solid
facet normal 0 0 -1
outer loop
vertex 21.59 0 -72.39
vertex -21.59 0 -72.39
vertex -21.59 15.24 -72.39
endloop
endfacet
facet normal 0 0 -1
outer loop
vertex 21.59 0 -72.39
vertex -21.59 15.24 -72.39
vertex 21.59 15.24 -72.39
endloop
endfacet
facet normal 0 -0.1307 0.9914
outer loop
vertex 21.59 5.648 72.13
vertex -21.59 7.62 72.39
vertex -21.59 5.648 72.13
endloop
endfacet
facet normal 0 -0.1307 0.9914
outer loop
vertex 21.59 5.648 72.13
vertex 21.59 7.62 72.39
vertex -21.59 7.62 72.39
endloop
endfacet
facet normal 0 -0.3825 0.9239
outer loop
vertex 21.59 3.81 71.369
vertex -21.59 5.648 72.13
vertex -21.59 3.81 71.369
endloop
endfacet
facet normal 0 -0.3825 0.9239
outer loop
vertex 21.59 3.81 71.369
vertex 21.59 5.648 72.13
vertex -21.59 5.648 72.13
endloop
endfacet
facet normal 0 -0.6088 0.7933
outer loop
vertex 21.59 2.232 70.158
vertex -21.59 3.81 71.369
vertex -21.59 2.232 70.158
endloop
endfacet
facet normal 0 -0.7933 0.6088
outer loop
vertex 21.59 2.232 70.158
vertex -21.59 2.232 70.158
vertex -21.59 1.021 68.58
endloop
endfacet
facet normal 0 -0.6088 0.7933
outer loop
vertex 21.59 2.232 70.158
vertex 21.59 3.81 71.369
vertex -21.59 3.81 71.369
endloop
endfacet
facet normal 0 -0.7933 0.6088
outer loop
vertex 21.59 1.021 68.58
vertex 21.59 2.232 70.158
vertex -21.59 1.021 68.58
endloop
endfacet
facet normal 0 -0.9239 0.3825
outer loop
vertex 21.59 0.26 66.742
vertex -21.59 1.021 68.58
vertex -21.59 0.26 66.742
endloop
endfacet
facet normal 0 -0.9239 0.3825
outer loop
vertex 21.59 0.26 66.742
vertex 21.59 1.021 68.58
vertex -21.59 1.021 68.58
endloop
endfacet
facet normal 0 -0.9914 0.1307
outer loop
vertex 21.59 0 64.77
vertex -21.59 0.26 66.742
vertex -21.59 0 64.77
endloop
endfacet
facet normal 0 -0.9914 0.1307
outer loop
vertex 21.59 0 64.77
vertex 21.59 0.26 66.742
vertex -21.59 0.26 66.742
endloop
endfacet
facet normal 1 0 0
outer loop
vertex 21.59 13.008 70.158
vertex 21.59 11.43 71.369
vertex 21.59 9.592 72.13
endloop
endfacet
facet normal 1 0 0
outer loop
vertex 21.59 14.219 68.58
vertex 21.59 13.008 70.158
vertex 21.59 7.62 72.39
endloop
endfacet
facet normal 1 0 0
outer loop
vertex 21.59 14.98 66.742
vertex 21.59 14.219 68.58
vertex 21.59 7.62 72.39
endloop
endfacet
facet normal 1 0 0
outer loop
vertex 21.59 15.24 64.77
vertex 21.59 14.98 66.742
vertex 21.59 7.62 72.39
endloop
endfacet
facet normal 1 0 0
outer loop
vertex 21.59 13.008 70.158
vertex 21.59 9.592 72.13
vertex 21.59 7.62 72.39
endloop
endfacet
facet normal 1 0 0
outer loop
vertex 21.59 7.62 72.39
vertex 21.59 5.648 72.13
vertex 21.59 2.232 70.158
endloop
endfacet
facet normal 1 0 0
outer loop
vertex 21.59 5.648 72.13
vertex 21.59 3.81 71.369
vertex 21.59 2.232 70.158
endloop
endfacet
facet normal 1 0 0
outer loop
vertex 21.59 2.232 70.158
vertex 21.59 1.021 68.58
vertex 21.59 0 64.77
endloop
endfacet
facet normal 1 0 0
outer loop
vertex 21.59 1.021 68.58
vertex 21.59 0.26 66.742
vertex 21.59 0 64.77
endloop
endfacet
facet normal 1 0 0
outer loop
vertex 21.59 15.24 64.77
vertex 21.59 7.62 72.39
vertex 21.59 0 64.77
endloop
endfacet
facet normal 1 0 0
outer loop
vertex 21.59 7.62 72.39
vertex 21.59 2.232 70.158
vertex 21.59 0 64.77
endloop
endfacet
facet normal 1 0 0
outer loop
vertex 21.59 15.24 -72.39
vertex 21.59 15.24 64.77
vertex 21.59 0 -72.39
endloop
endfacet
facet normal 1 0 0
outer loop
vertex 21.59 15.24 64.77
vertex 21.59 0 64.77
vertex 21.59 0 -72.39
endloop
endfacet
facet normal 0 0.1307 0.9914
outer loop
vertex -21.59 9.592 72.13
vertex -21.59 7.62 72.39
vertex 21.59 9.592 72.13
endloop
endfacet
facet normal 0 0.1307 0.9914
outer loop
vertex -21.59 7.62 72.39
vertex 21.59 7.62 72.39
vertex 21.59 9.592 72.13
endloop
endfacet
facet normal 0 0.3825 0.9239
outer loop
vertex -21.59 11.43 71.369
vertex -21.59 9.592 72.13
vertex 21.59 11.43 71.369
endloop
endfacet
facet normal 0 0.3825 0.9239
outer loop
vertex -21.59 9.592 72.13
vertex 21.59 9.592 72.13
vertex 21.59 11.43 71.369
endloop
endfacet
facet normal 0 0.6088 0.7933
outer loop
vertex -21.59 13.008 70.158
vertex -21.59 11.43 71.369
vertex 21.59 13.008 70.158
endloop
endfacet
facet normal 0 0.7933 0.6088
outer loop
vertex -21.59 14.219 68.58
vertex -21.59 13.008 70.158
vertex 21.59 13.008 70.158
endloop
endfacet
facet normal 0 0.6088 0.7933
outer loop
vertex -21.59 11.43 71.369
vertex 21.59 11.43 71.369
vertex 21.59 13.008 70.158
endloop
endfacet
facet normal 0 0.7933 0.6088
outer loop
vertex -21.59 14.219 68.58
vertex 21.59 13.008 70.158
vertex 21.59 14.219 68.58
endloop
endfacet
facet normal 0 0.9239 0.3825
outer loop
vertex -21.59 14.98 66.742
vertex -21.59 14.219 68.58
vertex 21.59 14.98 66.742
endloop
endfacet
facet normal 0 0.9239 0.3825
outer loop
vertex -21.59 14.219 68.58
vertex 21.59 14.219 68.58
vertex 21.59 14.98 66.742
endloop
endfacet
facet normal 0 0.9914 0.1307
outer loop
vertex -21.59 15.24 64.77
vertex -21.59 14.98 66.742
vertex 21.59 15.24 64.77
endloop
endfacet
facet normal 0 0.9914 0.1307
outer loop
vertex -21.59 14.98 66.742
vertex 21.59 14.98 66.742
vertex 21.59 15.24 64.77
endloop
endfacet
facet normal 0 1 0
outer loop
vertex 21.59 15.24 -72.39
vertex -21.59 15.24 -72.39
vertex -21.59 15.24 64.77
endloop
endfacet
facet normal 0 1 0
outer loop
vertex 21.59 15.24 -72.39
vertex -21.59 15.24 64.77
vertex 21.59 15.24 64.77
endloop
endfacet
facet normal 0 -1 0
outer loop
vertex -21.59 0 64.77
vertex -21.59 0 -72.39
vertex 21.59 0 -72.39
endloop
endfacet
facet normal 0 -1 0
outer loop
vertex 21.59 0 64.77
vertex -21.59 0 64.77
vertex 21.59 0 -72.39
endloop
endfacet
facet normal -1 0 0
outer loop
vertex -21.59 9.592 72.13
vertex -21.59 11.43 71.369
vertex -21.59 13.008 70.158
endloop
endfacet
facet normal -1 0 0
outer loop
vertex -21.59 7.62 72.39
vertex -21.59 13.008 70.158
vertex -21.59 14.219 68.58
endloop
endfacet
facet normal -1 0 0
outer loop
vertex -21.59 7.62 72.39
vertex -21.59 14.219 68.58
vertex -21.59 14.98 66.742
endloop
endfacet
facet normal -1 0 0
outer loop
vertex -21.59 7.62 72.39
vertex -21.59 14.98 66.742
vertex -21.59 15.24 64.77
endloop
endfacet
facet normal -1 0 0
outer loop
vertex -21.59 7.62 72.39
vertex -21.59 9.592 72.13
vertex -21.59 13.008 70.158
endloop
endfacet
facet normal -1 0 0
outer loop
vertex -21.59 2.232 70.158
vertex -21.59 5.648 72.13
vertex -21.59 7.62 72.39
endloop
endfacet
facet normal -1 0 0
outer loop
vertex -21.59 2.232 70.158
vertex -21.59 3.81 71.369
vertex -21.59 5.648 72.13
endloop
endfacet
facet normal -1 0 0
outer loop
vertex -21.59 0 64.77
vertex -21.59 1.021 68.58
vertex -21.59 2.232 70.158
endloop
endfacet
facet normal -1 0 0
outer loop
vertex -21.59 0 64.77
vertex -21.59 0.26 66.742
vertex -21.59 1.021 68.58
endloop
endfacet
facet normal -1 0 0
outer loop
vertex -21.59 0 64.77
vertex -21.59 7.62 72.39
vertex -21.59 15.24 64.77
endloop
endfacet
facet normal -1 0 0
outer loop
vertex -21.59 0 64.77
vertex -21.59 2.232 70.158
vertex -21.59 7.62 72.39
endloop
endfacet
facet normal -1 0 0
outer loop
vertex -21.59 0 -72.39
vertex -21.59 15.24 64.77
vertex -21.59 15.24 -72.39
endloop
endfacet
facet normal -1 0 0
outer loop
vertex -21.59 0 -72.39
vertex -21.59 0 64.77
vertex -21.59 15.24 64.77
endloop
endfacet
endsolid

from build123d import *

# Parameters (mm, degrees)
SKETCH1_W           = 43.18
SKETCH1_H           = 144.78
BOSS_EXTRUDE1_DEPTH = 15.24
FILLET1_R           = 7.62


with BuildPart() as part:
    # Sketch1 → Boss-Extrude1 (new body)
    with BuildSketch(Plane(origin=(0, 0, 0), x_dir=(1, 0, 0), z_dir=(0, 1, 0))):
        Rectangle(SKETCH1_W, SKETCH1_H)
    extrude(amount=BOSS_EXTRUDE1_DEPTH)

    # Fillet1
    fillet1_edges = [part.edges().sort_by_distance(p)[0] for p in [
        (0, 0, 72.39),
        (0, 15.24, 72.39),
    ]]
    fillet(fillet1_edges, radius=FILLET1_R - 0.0001)  # a hair under: the kernel refuses the full size


solid = part.part
